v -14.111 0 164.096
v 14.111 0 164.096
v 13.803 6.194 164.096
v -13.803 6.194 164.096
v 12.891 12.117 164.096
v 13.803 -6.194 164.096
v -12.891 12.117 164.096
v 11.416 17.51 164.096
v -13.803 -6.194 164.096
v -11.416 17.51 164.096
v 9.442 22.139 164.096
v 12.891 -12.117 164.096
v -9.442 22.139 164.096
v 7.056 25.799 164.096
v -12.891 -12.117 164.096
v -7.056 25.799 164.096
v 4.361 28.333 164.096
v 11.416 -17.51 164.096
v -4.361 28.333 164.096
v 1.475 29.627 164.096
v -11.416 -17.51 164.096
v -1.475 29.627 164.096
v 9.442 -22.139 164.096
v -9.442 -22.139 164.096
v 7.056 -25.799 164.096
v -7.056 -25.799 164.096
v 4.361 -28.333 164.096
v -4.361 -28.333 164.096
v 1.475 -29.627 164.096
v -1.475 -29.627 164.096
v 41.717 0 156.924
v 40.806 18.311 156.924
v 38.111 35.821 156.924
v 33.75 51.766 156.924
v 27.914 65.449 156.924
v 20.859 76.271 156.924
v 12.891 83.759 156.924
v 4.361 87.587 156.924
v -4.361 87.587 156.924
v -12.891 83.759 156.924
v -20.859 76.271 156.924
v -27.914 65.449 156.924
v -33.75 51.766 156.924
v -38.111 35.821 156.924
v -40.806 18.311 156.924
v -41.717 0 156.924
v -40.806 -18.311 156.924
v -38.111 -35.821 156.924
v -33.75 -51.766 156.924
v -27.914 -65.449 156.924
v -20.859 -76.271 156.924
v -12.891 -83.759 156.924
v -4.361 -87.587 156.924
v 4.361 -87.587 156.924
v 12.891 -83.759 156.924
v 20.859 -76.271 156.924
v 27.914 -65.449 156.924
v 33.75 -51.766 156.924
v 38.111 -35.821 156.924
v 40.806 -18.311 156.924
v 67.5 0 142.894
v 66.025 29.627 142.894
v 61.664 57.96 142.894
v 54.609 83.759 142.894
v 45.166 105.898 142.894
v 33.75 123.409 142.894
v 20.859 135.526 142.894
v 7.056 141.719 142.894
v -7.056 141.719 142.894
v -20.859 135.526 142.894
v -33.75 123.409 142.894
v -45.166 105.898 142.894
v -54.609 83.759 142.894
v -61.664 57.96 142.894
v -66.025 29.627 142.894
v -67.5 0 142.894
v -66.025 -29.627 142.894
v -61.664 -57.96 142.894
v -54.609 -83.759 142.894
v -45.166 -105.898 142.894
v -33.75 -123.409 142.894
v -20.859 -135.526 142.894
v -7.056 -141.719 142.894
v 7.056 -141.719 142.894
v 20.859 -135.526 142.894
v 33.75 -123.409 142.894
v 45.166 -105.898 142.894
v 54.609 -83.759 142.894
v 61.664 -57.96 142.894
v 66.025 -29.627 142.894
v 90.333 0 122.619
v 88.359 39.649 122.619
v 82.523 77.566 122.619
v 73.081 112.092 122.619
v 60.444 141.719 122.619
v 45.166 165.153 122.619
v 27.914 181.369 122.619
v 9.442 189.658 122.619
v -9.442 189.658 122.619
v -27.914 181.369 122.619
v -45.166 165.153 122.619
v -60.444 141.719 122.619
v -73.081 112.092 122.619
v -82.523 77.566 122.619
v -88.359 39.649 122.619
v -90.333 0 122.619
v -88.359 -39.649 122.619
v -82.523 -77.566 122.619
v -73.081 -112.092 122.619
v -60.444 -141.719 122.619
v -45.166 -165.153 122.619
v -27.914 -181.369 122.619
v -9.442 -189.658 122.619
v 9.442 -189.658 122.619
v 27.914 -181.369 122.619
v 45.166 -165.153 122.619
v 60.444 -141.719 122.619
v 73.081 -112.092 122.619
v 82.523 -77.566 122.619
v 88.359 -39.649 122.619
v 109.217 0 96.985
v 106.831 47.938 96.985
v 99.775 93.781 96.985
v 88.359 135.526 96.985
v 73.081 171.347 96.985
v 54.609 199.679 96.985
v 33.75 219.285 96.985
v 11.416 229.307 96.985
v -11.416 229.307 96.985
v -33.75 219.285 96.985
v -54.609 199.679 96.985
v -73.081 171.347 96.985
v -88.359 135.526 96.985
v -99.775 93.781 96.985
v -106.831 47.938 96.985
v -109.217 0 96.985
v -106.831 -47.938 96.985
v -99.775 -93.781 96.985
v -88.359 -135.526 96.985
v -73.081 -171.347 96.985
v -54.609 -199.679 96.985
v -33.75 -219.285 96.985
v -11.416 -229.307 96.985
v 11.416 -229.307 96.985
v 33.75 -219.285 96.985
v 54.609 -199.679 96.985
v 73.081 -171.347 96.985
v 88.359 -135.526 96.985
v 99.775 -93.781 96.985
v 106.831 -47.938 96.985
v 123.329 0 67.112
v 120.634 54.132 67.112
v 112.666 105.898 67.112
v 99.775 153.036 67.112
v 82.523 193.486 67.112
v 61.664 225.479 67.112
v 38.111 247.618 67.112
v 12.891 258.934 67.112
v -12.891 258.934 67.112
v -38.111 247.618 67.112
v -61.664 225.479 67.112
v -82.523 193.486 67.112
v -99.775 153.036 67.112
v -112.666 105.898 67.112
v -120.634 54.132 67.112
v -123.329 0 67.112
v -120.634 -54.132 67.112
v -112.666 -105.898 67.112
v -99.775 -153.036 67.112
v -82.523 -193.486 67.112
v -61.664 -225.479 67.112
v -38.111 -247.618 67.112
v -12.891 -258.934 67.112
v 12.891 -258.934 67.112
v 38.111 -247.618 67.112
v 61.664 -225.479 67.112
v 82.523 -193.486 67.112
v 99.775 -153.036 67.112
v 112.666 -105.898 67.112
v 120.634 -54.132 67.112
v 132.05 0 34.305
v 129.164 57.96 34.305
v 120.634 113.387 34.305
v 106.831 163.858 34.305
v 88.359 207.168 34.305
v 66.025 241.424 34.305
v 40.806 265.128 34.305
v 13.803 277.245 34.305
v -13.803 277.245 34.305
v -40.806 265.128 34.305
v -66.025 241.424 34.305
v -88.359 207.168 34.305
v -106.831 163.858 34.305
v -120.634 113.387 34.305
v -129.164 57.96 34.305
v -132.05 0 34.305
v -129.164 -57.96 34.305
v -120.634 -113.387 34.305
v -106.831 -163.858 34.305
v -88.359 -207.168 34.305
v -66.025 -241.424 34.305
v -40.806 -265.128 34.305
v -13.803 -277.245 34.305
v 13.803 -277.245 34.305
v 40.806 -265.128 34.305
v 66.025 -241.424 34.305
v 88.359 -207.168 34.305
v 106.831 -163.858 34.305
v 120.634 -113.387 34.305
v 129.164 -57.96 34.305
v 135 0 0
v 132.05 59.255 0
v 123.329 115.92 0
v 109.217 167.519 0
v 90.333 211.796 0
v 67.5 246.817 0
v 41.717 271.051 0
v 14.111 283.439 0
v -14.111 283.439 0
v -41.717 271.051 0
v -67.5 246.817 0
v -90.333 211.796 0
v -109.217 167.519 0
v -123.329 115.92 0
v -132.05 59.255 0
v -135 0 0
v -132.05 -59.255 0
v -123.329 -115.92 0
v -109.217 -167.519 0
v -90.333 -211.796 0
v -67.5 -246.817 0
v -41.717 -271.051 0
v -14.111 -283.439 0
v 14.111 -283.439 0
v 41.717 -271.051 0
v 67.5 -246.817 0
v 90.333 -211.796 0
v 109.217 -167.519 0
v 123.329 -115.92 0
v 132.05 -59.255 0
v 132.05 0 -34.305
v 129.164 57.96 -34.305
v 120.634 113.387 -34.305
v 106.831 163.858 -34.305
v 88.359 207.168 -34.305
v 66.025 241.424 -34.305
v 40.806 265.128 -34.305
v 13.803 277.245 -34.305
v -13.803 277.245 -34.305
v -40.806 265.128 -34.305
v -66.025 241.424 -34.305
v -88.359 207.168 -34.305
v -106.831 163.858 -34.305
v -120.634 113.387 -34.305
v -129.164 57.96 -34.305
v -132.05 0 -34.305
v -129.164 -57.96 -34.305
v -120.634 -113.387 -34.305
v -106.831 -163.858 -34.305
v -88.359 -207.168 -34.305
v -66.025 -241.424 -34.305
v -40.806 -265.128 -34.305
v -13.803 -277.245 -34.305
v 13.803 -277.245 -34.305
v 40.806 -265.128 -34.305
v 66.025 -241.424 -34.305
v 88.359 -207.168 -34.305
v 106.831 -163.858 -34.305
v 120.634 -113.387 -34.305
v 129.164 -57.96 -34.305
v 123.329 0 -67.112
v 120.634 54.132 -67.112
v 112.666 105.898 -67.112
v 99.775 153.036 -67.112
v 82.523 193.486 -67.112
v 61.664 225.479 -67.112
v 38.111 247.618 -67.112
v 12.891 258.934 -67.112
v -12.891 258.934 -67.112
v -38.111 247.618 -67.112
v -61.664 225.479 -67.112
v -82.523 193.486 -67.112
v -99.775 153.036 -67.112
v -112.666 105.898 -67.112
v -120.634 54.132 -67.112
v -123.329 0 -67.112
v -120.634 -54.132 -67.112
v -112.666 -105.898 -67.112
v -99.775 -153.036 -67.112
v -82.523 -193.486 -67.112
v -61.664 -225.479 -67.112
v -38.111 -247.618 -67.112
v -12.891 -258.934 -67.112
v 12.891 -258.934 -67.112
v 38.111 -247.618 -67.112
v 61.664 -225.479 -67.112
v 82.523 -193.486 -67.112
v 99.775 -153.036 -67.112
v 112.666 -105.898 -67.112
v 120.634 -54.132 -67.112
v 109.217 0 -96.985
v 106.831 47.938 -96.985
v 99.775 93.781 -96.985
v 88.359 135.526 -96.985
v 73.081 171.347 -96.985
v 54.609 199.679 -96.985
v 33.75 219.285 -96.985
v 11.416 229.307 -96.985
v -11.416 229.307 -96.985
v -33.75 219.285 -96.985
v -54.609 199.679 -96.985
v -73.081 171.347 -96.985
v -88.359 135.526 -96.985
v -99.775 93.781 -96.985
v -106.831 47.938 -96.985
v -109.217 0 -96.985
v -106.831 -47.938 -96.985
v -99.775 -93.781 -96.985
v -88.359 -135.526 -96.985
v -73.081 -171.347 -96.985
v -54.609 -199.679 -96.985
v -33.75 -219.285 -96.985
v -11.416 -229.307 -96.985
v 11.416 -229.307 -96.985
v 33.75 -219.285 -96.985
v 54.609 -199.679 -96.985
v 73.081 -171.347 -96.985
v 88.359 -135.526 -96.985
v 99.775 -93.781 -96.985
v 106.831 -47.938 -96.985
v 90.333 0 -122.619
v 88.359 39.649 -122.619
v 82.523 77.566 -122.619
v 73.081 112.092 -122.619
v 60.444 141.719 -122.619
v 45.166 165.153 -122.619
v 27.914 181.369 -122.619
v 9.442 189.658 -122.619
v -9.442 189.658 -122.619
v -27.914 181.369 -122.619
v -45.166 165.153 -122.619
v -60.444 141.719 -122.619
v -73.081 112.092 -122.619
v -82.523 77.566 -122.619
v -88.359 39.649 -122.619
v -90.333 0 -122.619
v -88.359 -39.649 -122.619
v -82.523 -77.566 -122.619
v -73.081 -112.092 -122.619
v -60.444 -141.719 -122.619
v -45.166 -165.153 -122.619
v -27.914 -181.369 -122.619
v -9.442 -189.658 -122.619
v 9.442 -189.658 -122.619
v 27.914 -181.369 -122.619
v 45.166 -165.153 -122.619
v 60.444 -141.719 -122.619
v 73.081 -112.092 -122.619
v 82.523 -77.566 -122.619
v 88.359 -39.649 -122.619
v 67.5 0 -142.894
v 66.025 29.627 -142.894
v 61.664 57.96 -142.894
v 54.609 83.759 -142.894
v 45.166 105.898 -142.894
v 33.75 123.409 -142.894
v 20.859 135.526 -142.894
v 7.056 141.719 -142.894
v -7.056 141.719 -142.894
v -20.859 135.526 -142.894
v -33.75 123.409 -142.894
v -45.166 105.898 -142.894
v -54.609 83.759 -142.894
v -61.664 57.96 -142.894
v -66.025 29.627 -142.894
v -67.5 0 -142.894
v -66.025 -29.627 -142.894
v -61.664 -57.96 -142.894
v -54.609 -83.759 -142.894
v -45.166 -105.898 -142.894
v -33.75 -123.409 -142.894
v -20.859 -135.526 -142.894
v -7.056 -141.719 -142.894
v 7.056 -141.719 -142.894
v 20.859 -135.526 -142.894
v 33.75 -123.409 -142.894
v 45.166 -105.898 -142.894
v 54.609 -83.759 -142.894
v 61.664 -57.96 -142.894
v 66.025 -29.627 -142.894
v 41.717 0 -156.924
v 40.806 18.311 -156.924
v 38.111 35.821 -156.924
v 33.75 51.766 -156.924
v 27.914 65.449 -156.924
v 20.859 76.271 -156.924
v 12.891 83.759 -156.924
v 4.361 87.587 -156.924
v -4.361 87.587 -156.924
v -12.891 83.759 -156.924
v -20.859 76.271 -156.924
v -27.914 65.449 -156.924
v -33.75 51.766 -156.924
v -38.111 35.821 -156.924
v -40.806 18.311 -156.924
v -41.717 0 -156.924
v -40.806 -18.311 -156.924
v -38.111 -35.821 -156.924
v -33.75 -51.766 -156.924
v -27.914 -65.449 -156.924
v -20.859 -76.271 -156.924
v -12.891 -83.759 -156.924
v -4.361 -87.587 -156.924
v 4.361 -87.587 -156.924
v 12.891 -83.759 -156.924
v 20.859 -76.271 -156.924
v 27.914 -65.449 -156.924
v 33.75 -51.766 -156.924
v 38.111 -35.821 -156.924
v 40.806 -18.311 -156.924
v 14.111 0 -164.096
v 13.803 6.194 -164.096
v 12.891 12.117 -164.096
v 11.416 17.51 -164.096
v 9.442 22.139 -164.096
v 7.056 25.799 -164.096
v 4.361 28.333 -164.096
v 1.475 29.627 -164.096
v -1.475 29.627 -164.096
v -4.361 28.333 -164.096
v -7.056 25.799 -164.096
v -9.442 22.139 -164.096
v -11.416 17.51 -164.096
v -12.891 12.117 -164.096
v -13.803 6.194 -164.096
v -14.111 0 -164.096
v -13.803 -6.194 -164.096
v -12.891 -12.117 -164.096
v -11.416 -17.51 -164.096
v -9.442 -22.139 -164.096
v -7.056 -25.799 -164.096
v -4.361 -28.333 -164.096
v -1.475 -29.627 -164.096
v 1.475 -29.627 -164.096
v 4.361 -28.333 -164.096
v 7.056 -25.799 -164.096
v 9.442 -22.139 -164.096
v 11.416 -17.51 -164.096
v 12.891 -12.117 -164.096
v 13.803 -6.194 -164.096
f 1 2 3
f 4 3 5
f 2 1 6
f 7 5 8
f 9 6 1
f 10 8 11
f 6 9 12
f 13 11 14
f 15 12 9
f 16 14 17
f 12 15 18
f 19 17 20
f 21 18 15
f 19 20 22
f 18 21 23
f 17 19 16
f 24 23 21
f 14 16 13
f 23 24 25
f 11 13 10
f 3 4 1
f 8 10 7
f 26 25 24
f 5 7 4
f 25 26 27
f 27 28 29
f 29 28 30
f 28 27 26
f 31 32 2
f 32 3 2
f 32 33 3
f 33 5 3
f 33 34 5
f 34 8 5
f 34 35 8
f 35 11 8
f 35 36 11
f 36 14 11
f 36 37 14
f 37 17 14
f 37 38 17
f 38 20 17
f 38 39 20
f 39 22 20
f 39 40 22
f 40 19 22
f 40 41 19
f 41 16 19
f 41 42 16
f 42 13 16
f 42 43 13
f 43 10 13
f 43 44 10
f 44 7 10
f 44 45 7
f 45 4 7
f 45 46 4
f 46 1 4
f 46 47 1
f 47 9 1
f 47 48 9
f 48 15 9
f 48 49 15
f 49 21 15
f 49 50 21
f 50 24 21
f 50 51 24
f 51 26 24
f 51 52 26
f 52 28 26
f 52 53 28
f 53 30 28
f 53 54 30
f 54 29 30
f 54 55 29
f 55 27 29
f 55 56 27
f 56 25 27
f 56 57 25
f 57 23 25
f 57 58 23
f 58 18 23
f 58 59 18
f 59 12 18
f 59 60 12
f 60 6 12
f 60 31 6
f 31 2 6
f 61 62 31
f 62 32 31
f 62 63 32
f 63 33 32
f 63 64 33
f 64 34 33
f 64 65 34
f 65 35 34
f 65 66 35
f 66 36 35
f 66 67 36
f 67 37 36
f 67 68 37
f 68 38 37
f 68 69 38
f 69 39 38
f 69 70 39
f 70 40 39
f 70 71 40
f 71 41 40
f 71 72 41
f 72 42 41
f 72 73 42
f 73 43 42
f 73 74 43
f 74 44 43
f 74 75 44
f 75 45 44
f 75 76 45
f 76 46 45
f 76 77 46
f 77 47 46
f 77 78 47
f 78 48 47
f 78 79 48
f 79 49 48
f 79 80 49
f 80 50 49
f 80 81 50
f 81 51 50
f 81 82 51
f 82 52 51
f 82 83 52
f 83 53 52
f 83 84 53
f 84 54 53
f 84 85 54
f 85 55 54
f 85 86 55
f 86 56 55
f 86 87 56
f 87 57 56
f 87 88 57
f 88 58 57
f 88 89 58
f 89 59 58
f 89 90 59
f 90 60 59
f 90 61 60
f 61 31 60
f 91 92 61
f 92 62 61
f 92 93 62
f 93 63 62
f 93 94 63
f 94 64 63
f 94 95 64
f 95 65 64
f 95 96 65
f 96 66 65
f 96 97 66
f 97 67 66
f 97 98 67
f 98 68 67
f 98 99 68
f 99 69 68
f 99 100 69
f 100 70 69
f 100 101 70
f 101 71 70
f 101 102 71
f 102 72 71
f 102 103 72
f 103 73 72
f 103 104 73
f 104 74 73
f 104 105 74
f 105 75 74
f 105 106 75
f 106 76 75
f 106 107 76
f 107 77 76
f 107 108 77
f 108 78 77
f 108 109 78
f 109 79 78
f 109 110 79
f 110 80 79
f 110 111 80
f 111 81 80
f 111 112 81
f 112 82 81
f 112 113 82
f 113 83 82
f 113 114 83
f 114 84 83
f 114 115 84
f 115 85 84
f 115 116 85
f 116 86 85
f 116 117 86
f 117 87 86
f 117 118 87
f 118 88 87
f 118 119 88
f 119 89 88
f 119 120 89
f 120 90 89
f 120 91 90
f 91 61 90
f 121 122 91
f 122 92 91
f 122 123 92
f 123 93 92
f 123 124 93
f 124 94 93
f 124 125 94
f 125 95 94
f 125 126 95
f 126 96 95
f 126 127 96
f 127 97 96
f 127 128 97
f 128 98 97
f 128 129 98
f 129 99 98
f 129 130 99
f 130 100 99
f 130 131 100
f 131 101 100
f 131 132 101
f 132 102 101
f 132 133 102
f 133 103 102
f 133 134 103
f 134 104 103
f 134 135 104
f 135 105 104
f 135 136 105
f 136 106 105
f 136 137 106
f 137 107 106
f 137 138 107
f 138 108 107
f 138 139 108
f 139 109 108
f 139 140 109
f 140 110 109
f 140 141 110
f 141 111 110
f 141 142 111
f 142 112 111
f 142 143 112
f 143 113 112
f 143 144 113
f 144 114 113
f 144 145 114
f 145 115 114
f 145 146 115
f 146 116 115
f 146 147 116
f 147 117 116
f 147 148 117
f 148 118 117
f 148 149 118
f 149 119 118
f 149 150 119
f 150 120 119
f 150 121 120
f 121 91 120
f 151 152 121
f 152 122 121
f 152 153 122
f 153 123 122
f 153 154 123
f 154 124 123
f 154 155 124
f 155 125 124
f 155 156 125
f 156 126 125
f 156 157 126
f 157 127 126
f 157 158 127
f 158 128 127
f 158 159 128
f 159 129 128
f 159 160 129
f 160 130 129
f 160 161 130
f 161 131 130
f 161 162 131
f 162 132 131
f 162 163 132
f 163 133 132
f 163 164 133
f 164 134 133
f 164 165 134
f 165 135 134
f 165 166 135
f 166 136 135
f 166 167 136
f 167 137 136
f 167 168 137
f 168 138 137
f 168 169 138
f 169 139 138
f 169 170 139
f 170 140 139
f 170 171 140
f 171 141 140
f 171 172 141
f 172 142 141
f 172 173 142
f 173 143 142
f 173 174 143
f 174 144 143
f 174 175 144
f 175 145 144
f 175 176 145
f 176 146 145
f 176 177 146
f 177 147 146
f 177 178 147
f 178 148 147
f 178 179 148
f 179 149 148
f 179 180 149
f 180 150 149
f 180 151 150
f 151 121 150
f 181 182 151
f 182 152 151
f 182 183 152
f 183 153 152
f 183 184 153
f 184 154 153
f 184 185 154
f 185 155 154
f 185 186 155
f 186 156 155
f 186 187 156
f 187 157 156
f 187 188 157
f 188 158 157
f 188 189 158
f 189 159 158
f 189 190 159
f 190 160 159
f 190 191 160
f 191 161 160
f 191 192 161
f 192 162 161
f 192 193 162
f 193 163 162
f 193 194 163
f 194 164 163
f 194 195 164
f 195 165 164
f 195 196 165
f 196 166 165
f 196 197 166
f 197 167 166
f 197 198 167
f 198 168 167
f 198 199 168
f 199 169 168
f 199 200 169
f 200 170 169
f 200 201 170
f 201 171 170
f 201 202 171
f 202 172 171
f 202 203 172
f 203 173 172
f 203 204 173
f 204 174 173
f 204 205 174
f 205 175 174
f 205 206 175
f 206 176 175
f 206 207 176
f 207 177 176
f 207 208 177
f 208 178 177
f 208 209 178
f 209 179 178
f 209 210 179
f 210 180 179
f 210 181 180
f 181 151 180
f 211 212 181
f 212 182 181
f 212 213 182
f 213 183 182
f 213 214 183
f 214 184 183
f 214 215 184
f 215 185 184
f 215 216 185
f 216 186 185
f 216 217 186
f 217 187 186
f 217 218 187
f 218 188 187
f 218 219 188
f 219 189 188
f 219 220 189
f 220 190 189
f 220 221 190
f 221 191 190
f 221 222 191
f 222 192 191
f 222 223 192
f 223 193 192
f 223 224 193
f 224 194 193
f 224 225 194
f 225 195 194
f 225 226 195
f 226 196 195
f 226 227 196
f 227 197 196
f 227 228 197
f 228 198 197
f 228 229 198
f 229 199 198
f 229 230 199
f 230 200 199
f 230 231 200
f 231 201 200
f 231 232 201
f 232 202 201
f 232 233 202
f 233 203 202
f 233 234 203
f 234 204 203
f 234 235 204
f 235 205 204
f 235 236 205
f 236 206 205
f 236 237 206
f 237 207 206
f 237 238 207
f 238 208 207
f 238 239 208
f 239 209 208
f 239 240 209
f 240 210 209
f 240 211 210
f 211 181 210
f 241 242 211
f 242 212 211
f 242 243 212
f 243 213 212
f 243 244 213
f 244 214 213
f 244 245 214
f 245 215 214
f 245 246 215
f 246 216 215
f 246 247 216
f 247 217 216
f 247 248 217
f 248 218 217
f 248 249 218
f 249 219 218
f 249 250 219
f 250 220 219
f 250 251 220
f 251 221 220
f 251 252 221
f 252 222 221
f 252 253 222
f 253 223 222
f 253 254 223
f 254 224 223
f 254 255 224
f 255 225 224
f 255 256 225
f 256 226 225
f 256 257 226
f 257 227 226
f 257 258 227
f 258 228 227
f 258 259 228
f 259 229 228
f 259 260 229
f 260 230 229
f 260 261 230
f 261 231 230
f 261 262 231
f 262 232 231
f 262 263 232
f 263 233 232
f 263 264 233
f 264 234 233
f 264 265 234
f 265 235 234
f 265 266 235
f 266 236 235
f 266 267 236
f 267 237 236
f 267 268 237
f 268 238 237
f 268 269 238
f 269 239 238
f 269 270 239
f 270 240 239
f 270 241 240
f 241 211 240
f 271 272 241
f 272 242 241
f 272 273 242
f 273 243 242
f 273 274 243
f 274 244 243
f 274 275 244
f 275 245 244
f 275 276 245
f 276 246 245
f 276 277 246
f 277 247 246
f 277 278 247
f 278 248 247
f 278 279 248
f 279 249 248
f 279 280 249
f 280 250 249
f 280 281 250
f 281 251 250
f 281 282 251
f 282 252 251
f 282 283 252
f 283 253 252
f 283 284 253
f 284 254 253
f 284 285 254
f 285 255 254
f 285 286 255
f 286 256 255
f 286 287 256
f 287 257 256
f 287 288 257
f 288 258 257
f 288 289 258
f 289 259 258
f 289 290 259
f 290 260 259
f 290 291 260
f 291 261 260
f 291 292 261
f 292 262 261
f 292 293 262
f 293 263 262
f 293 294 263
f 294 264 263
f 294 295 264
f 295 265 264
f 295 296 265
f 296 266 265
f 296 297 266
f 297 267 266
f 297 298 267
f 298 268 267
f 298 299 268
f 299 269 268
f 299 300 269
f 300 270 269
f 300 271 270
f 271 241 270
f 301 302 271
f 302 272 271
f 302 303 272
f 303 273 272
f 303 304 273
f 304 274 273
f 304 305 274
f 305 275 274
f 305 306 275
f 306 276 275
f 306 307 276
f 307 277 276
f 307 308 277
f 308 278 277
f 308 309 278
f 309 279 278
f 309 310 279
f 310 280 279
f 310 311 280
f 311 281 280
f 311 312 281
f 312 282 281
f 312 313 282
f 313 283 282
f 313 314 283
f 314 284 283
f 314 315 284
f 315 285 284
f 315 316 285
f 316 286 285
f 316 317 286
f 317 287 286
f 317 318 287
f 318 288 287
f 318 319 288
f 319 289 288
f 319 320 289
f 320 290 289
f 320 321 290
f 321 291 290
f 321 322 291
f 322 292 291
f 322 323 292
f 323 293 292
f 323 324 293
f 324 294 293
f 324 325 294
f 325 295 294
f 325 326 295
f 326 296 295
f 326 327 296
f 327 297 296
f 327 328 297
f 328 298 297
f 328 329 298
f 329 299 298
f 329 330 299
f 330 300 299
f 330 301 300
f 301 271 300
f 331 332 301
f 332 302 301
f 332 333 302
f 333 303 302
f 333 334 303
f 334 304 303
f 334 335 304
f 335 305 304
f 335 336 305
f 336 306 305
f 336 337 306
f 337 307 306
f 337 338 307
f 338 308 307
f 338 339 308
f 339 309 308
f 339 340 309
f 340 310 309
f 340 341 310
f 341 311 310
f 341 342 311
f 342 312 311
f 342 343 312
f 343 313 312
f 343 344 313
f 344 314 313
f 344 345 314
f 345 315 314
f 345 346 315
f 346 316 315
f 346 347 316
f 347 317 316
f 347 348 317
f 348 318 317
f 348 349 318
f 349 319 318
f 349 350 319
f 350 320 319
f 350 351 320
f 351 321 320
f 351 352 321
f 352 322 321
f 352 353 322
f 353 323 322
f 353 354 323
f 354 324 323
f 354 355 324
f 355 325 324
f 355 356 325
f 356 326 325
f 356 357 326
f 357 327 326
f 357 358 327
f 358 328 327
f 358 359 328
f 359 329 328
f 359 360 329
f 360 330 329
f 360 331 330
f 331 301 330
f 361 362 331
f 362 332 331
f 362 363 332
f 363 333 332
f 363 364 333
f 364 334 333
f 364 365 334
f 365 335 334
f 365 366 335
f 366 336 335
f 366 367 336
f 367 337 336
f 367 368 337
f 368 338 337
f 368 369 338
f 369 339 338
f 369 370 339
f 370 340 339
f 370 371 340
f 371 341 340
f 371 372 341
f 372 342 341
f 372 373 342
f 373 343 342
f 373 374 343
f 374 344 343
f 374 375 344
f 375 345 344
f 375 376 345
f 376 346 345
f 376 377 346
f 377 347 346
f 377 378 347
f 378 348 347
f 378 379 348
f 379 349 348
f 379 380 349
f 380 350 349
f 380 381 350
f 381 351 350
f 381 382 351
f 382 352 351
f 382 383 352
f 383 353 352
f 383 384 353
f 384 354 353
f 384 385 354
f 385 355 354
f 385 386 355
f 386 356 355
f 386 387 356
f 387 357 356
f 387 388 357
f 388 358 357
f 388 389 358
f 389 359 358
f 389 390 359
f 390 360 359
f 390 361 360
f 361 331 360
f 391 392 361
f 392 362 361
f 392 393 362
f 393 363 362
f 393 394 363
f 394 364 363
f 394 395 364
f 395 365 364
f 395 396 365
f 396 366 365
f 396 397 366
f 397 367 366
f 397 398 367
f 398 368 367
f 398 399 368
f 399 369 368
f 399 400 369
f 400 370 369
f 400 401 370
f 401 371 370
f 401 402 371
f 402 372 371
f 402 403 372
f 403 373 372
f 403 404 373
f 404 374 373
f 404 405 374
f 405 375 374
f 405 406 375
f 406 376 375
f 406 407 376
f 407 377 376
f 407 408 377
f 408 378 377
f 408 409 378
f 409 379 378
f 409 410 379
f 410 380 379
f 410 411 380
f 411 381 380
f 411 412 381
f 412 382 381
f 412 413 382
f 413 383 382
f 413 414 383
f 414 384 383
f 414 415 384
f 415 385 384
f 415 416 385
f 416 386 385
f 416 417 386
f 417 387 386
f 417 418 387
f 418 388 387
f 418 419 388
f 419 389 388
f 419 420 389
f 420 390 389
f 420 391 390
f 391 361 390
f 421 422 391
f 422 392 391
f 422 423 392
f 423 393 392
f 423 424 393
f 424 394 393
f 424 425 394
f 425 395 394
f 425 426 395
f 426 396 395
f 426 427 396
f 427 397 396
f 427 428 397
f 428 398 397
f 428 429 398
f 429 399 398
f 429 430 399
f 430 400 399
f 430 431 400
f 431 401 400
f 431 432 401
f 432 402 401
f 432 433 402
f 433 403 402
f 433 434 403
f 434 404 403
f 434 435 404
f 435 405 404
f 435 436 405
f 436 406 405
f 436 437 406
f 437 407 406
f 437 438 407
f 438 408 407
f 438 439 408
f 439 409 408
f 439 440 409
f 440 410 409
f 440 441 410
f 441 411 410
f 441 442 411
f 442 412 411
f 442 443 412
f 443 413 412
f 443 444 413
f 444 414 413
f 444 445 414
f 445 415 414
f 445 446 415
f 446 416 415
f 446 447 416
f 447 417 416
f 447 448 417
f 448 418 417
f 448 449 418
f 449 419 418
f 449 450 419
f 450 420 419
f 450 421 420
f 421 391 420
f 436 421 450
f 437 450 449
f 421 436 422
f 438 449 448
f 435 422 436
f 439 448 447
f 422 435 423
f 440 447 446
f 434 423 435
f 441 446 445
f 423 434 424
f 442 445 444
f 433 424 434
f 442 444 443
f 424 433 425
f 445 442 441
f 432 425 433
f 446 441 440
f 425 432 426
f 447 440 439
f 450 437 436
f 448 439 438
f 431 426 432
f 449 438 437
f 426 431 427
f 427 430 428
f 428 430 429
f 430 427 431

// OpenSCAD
// Generated by SolidPython 1.0.1 on 2020-07-29 00:46:49


scale(v = [9, 19, 11]) {
	sphere(r = 15);
}
/***********************************************
*********      SolidPython code:      **********
************************************************
 
# import packages: SolidPython
from solid import *
from solid.utils import *
from itertools import chain, combinations, permutations


class Resize:

    def __init__(self, scad_file):
        self.scad_file = scad_file
        #self.scad_file = import_scad(scad_file)
        # cone/cylinder param:
        self.r1 = 0
        self.r2 = 0
        self.h = 0
        # rectangular prism param:
        self.w = 0
        self.l = 0
        # ellipse param:
        self.r = 0

    # import OpenScad code (file name corresponds to shape)


    # classify shape + parameters
    def assign(self, param1, param2, param3):
        if self.scad_file == 'cone.scad':
            self.r1 = param1
            self.r2 = param2
            self.h = param3
        elif self.scad_file == 'cylinder.scad':
            self.r1 = param1
            self.r2 = param2
            self.h = param3
        elif self.scad_file == 'rectangularPrism.scad':
            self.h = param1
            self.l = param2
            self.w = param3
        else:
            self.r = param1
            self.h = param2

    # resize parameters
    def iterate(self):
        x = range(3, 20, 2)
        i = 1
        if self.scad_file == 'cone.scad':
            tempList = list(permutations(x, 2))
            for temp in tempList:
                param1 = temp[0]
                param2 = temp[1]
                filepath = 'produced_scad_files/' + 'cone' + str(param1) + '_' + str(param2) + '_' + '.scad'
                scad_render_to_file(cylinder(h=param1, r1=param2, r2=0), filepath)

        elif self.scad_file == 'cylinder.scad':
            tempList = list(permutations(x, 3))
            for temp in tempList:
                param1 = temp[0]
                param2 = temp[1]
                filepath = 'produced_scad_files/' + 'cylinder' + str(param1) + '_' + str(param2) + '_' + '.scad'
                scad_render_to_file(cylinder(h=param1, r1=param2, r2=param2), filepath)

        elif self.scad_file == 'rectangularPrism.scad':
            tempList = list(permutations(x, 3))
            for temp in tempList:
                param1 = temp[0]
                param2 = temp[1]
                param3 = temp[2]
                filepath = 'produced_scad_files/' + 'rectangularPrism' + str(param1) + '_' + str(param2) + '_' + str(
                    param3) + '.scad'
                scad_render_to_file(cube(size=(param1, param2, param3)), filepath)

        elif self.scad_file == 'ellipse.scad':
            tempList = list(permutations(x, 4))
            for temp in tempList:
                param1 = temp[0]
                param2 = temp[1]
                param3 = temp[2]
                param4 = temp[3]
                filepath = 'produced_scad_files/' + 'ellipse' + str(param1) + '_' + str(param2) + '_' + str(param3) + '_' + str(param4) + '.scad'
                scad_render_to_file(scale([param1, param2, param3])(sphere(r=param4)), filepath)

    def render_to_scadfile(self):
        scad_render_to_file(scad, 'example.scad') 
 
************************************************/
